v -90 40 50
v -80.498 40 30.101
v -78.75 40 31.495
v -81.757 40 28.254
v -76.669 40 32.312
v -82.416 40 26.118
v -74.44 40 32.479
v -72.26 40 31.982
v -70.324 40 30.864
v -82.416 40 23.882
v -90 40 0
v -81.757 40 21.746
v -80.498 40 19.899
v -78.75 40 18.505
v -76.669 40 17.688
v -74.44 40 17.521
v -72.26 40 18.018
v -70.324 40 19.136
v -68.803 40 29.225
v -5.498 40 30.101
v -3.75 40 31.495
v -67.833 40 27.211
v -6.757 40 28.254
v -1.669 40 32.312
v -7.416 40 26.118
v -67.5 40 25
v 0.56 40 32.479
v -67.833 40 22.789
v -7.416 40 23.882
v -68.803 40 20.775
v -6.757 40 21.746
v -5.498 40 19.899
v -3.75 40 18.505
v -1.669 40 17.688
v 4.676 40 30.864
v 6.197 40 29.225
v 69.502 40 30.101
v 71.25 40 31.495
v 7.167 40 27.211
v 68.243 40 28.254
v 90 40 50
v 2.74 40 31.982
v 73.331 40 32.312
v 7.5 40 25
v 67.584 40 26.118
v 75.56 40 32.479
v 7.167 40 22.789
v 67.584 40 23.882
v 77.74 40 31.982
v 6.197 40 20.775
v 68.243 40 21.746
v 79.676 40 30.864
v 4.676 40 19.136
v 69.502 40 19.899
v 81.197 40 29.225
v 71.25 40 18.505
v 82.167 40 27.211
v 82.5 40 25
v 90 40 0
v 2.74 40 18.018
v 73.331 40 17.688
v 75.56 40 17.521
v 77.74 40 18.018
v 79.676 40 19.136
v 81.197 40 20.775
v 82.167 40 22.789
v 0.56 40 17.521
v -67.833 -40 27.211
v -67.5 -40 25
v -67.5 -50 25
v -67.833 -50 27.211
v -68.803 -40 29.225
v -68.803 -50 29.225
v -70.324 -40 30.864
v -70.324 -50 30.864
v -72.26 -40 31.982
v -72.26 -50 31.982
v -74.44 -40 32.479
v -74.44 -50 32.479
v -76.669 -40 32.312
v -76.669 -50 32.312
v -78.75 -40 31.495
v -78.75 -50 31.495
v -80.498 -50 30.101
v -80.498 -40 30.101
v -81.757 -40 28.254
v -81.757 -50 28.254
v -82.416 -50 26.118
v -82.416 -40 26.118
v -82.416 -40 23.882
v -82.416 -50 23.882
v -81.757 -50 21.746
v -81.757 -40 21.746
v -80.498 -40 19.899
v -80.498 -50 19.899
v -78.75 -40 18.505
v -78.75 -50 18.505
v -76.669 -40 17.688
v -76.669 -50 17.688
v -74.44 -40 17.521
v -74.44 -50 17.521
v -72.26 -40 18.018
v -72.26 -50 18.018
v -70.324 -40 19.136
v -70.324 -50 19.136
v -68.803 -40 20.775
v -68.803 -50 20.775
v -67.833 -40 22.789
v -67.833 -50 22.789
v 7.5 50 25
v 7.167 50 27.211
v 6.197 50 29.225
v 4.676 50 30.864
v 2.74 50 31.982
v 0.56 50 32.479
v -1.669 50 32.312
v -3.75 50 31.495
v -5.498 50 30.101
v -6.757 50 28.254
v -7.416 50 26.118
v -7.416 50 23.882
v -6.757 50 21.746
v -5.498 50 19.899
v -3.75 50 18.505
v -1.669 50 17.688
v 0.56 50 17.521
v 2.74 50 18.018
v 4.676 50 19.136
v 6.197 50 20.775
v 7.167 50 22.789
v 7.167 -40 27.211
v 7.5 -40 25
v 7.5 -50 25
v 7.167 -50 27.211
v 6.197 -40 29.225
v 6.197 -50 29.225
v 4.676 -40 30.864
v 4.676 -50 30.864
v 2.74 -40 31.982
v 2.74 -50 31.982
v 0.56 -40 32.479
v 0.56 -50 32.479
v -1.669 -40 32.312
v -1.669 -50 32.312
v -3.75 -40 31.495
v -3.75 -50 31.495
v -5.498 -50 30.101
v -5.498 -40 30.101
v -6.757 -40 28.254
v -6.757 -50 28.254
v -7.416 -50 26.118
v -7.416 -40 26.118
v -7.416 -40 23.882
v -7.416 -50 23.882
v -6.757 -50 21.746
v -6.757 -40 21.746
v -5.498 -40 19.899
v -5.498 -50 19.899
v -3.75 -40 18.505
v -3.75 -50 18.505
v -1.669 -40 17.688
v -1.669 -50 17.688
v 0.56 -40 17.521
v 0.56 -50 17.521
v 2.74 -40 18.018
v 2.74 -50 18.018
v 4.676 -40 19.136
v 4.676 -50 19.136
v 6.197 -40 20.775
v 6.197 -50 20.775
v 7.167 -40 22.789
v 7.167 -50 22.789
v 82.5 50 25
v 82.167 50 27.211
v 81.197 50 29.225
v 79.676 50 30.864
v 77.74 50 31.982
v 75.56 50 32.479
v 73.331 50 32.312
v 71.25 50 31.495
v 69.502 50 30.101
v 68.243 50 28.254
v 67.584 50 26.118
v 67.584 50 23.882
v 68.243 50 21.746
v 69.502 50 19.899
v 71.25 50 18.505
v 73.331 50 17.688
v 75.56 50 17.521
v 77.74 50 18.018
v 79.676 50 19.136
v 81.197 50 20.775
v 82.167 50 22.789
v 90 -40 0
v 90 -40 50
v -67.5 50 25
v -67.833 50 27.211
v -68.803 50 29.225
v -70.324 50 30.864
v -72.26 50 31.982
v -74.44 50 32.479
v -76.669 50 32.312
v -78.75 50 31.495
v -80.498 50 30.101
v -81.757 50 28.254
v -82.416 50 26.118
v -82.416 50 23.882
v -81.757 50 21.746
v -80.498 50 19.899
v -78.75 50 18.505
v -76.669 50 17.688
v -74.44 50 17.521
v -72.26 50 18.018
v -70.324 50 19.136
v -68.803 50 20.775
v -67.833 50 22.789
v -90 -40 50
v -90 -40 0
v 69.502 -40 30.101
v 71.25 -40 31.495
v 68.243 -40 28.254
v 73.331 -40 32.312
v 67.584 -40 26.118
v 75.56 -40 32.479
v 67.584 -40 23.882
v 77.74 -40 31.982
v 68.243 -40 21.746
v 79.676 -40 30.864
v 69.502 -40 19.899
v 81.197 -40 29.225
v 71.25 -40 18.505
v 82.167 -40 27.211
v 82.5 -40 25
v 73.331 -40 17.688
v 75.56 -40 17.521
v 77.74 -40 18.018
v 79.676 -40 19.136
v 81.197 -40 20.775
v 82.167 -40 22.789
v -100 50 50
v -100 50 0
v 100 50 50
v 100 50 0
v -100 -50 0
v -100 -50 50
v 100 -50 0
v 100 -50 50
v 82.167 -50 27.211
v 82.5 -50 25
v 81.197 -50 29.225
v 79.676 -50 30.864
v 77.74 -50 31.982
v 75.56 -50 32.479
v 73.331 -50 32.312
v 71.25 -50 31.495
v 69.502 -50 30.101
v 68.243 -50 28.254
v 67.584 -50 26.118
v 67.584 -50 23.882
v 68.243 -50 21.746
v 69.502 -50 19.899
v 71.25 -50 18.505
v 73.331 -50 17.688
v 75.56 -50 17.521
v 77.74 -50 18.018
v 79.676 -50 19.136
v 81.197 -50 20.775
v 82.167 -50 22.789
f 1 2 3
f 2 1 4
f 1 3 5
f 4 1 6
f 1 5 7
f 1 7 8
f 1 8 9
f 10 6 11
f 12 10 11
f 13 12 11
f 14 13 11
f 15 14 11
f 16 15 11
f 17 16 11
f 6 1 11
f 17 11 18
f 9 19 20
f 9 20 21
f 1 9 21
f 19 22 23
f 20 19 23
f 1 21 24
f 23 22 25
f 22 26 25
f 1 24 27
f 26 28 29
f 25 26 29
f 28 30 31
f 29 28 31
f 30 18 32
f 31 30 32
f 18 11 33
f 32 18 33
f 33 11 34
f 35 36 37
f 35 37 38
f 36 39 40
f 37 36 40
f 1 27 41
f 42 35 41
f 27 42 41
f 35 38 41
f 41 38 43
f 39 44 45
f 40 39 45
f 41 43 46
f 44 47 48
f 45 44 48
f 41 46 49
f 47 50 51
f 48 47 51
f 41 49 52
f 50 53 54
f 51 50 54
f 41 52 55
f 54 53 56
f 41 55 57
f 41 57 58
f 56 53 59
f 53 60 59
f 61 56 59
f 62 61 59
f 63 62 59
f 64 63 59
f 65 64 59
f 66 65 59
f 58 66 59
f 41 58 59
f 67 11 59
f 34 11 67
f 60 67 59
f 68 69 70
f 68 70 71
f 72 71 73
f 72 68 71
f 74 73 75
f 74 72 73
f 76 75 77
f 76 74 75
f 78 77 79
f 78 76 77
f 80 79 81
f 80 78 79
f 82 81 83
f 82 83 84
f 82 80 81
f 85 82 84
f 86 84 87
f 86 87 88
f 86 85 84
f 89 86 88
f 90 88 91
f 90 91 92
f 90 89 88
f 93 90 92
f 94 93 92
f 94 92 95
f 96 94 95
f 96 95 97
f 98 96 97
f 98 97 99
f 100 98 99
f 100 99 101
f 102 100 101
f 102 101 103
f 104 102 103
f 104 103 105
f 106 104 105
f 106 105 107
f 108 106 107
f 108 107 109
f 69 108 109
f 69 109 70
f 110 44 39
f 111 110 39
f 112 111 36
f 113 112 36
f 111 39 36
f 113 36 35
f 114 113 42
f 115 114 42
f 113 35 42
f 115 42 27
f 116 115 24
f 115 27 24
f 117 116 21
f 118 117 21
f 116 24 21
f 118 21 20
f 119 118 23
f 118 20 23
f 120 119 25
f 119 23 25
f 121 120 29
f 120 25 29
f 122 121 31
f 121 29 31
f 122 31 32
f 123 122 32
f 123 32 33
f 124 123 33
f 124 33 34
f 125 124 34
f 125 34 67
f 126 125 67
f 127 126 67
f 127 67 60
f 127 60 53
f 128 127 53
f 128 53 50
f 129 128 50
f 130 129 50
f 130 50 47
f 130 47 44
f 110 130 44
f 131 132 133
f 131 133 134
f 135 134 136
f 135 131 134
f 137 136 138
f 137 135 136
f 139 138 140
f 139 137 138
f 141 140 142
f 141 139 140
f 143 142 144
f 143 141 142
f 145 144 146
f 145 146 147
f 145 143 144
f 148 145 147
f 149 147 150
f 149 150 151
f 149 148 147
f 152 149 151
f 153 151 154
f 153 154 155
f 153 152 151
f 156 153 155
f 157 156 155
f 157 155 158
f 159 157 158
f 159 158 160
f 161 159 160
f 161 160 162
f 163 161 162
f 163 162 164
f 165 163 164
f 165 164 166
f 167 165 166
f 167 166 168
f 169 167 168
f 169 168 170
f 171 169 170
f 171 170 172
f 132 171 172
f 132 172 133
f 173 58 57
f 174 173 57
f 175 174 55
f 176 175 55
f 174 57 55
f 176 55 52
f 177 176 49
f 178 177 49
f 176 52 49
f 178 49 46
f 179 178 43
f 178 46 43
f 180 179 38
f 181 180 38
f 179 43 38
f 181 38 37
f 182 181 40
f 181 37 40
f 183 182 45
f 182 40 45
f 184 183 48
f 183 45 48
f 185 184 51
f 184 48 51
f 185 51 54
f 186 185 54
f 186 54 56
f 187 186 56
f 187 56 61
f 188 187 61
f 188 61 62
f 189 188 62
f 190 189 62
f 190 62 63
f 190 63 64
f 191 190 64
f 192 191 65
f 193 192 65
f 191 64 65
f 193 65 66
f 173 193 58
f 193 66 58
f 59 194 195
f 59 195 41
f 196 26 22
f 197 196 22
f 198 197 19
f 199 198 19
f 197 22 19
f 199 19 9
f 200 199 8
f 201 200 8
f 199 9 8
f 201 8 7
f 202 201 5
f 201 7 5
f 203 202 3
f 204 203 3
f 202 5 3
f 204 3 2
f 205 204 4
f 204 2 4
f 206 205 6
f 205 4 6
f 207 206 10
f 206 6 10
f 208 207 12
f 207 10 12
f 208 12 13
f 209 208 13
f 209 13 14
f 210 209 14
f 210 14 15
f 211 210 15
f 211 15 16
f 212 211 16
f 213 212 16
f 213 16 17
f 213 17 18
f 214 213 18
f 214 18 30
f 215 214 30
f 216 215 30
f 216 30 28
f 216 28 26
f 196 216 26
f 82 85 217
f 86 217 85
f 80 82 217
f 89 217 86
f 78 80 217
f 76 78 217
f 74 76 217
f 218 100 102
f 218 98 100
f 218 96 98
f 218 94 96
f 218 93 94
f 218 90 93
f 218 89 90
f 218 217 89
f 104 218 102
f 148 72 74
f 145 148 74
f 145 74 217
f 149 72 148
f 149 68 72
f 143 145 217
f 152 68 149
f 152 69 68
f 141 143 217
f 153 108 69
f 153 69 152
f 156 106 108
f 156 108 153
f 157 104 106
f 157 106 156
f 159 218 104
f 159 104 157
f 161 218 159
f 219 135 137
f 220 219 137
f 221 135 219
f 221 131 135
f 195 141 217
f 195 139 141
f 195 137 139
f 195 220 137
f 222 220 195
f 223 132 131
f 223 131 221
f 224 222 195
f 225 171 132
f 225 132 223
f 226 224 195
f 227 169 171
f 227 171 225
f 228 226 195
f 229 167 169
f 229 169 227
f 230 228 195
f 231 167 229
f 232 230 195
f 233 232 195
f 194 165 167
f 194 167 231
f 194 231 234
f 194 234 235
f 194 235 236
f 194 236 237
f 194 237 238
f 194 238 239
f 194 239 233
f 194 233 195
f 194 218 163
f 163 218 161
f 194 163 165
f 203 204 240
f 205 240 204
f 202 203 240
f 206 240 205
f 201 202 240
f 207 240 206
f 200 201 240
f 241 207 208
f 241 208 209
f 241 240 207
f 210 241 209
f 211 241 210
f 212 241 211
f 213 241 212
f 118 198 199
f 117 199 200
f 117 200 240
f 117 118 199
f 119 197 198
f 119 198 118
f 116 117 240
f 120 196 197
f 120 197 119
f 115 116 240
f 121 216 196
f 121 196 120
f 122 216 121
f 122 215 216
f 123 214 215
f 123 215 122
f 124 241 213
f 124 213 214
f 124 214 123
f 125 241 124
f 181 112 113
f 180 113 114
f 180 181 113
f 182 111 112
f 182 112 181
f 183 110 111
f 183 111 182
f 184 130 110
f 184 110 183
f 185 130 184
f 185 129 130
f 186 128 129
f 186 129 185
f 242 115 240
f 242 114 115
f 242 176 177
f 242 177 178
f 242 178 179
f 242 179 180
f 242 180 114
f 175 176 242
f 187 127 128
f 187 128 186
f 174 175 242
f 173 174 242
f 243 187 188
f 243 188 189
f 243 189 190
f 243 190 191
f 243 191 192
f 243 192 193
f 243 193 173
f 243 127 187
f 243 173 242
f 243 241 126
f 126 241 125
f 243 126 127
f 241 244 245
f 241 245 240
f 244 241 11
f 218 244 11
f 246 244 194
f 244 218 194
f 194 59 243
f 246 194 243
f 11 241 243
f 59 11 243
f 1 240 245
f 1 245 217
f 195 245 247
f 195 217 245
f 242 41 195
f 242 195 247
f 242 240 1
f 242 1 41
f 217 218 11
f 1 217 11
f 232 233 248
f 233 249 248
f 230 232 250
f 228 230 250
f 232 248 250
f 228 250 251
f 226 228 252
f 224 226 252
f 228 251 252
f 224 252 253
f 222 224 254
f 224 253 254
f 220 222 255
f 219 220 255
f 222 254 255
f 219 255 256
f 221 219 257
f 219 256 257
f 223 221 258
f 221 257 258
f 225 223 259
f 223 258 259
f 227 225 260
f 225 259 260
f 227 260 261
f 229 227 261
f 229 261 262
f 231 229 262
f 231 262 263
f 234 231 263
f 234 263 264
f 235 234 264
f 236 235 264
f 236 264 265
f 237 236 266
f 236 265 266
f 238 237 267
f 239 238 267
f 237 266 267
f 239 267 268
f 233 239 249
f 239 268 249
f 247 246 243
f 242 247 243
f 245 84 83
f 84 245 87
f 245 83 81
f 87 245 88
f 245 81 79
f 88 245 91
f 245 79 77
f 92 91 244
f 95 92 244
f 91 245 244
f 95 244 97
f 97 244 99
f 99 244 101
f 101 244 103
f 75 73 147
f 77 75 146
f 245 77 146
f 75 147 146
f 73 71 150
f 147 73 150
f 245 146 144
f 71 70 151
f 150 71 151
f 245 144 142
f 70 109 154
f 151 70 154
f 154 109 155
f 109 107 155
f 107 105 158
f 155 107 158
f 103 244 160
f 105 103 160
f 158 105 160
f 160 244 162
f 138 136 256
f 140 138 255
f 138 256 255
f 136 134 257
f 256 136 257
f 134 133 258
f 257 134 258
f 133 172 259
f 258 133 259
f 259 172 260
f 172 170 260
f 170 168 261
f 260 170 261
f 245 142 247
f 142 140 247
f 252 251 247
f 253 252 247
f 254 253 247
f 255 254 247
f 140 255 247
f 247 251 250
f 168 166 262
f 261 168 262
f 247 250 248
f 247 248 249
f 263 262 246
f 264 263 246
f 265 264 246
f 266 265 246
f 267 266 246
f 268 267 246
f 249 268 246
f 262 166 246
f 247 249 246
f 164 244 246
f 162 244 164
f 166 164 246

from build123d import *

# Parameters (mm, degrees)
F0_W     = 200
F0_H     = 100
F0_W_2   = 180
F0_H_2   = 80
F1_DEPTH = 50
F2_R     = 7.5
F3_DEPTH = 50


with BuildPart() as f1:
    # F0 (on Top) → F1 (new body)
    with BuildSketch(Plane.XY):
        Rectangle(F0_W, F0_H)
        Rectangle(F0_W_2, F0_H_2, mode=Mode.SUBTRACT)
    extrude(amount=F1_DEPTH)

    # F2 (on Front) → F3 (cut, symmetric)
    with BuildSketch(Plane.XZ):
        with Locations((0, 25)):
            Circle(F2_R)
        with Locations((-75, 25)):
            Circle(F2_R)
        with Locations((75, 25)):
            Circle(F2_R)
    extrude(amount=F3_DEPTH, both=True, mode=Mode.SUBTRACT)


solid = f1.part
